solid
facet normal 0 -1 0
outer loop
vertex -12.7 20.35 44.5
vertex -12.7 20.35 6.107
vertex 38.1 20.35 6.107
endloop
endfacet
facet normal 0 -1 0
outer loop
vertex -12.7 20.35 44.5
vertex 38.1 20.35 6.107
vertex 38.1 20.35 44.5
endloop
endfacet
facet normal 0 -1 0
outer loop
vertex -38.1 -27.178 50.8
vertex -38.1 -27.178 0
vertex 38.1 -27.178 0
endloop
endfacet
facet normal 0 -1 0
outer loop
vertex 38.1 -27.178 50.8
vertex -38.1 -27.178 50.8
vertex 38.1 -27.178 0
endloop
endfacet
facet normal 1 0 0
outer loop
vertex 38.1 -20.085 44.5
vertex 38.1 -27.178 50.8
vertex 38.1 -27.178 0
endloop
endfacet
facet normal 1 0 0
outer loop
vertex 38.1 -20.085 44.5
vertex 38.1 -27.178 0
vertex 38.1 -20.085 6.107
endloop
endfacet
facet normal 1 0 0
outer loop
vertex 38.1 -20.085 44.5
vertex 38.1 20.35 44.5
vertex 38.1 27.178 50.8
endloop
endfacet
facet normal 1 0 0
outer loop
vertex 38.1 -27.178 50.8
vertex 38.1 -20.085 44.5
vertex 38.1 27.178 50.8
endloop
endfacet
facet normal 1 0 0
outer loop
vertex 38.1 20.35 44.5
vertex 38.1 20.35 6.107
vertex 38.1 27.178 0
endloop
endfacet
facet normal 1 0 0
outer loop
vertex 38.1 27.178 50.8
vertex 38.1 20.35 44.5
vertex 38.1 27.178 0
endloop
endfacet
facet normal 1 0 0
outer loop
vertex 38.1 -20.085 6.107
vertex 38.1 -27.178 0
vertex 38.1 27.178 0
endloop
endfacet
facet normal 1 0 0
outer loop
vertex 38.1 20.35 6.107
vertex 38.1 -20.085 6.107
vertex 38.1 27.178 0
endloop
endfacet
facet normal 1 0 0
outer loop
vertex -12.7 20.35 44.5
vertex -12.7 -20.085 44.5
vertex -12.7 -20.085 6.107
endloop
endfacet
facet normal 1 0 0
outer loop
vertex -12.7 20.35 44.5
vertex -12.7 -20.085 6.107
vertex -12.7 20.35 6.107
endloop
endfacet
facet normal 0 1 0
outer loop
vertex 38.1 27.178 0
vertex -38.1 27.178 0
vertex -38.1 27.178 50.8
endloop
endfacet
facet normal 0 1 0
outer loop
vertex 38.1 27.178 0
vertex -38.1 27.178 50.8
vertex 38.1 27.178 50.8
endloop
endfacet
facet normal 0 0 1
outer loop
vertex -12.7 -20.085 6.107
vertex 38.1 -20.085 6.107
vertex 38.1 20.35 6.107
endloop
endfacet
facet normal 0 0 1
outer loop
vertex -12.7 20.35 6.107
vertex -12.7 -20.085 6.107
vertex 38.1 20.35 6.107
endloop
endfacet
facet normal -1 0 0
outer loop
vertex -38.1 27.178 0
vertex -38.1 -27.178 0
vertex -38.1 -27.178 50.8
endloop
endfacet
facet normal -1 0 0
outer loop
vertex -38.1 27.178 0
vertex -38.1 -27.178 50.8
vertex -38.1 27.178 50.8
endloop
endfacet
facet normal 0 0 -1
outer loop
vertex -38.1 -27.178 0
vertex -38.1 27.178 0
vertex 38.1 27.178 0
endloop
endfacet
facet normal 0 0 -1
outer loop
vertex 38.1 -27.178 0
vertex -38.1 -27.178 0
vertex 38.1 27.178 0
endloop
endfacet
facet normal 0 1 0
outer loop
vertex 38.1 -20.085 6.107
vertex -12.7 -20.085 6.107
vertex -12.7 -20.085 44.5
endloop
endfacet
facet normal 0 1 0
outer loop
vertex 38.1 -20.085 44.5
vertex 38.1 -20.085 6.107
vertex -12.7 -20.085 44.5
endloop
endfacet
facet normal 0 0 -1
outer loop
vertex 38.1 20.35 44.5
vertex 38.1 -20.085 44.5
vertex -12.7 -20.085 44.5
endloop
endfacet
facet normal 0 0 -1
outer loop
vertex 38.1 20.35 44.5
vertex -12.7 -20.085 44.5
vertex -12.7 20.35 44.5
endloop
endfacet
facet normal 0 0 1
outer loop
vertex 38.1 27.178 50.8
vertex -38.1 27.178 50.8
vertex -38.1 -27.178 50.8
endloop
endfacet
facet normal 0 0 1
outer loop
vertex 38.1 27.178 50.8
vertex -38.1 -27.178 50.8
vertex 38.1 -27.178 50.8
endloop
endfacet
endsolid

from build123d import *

# Parameters (mm, degrees)
F0_W     = 76.2
F0_H     = 54.356
F1_DEPTH = 50.8
F2_W     = 40.435703
F2_H     = 38.392941
F3_DEPTH = 50.8


with BuildPart() as f1:
    # F0 (on Top) → F1 (new body)
    with BuildSketch(Plane.XY):
        Rectangle(F0_W, F0_H)
    extrude(amount=F1_DEPTH)

    # F2 (on face) → F3 (cut)
    with BuildSketch(Plane.YZ.offset(38.1)):
        with Locations((0.132361, 25.30353)):
            Rectangle(F2_W, F2_H)
    extrude(amount=-F3_DEPTH, mode=Mode.SUBTRACT)


solid = f1.part
